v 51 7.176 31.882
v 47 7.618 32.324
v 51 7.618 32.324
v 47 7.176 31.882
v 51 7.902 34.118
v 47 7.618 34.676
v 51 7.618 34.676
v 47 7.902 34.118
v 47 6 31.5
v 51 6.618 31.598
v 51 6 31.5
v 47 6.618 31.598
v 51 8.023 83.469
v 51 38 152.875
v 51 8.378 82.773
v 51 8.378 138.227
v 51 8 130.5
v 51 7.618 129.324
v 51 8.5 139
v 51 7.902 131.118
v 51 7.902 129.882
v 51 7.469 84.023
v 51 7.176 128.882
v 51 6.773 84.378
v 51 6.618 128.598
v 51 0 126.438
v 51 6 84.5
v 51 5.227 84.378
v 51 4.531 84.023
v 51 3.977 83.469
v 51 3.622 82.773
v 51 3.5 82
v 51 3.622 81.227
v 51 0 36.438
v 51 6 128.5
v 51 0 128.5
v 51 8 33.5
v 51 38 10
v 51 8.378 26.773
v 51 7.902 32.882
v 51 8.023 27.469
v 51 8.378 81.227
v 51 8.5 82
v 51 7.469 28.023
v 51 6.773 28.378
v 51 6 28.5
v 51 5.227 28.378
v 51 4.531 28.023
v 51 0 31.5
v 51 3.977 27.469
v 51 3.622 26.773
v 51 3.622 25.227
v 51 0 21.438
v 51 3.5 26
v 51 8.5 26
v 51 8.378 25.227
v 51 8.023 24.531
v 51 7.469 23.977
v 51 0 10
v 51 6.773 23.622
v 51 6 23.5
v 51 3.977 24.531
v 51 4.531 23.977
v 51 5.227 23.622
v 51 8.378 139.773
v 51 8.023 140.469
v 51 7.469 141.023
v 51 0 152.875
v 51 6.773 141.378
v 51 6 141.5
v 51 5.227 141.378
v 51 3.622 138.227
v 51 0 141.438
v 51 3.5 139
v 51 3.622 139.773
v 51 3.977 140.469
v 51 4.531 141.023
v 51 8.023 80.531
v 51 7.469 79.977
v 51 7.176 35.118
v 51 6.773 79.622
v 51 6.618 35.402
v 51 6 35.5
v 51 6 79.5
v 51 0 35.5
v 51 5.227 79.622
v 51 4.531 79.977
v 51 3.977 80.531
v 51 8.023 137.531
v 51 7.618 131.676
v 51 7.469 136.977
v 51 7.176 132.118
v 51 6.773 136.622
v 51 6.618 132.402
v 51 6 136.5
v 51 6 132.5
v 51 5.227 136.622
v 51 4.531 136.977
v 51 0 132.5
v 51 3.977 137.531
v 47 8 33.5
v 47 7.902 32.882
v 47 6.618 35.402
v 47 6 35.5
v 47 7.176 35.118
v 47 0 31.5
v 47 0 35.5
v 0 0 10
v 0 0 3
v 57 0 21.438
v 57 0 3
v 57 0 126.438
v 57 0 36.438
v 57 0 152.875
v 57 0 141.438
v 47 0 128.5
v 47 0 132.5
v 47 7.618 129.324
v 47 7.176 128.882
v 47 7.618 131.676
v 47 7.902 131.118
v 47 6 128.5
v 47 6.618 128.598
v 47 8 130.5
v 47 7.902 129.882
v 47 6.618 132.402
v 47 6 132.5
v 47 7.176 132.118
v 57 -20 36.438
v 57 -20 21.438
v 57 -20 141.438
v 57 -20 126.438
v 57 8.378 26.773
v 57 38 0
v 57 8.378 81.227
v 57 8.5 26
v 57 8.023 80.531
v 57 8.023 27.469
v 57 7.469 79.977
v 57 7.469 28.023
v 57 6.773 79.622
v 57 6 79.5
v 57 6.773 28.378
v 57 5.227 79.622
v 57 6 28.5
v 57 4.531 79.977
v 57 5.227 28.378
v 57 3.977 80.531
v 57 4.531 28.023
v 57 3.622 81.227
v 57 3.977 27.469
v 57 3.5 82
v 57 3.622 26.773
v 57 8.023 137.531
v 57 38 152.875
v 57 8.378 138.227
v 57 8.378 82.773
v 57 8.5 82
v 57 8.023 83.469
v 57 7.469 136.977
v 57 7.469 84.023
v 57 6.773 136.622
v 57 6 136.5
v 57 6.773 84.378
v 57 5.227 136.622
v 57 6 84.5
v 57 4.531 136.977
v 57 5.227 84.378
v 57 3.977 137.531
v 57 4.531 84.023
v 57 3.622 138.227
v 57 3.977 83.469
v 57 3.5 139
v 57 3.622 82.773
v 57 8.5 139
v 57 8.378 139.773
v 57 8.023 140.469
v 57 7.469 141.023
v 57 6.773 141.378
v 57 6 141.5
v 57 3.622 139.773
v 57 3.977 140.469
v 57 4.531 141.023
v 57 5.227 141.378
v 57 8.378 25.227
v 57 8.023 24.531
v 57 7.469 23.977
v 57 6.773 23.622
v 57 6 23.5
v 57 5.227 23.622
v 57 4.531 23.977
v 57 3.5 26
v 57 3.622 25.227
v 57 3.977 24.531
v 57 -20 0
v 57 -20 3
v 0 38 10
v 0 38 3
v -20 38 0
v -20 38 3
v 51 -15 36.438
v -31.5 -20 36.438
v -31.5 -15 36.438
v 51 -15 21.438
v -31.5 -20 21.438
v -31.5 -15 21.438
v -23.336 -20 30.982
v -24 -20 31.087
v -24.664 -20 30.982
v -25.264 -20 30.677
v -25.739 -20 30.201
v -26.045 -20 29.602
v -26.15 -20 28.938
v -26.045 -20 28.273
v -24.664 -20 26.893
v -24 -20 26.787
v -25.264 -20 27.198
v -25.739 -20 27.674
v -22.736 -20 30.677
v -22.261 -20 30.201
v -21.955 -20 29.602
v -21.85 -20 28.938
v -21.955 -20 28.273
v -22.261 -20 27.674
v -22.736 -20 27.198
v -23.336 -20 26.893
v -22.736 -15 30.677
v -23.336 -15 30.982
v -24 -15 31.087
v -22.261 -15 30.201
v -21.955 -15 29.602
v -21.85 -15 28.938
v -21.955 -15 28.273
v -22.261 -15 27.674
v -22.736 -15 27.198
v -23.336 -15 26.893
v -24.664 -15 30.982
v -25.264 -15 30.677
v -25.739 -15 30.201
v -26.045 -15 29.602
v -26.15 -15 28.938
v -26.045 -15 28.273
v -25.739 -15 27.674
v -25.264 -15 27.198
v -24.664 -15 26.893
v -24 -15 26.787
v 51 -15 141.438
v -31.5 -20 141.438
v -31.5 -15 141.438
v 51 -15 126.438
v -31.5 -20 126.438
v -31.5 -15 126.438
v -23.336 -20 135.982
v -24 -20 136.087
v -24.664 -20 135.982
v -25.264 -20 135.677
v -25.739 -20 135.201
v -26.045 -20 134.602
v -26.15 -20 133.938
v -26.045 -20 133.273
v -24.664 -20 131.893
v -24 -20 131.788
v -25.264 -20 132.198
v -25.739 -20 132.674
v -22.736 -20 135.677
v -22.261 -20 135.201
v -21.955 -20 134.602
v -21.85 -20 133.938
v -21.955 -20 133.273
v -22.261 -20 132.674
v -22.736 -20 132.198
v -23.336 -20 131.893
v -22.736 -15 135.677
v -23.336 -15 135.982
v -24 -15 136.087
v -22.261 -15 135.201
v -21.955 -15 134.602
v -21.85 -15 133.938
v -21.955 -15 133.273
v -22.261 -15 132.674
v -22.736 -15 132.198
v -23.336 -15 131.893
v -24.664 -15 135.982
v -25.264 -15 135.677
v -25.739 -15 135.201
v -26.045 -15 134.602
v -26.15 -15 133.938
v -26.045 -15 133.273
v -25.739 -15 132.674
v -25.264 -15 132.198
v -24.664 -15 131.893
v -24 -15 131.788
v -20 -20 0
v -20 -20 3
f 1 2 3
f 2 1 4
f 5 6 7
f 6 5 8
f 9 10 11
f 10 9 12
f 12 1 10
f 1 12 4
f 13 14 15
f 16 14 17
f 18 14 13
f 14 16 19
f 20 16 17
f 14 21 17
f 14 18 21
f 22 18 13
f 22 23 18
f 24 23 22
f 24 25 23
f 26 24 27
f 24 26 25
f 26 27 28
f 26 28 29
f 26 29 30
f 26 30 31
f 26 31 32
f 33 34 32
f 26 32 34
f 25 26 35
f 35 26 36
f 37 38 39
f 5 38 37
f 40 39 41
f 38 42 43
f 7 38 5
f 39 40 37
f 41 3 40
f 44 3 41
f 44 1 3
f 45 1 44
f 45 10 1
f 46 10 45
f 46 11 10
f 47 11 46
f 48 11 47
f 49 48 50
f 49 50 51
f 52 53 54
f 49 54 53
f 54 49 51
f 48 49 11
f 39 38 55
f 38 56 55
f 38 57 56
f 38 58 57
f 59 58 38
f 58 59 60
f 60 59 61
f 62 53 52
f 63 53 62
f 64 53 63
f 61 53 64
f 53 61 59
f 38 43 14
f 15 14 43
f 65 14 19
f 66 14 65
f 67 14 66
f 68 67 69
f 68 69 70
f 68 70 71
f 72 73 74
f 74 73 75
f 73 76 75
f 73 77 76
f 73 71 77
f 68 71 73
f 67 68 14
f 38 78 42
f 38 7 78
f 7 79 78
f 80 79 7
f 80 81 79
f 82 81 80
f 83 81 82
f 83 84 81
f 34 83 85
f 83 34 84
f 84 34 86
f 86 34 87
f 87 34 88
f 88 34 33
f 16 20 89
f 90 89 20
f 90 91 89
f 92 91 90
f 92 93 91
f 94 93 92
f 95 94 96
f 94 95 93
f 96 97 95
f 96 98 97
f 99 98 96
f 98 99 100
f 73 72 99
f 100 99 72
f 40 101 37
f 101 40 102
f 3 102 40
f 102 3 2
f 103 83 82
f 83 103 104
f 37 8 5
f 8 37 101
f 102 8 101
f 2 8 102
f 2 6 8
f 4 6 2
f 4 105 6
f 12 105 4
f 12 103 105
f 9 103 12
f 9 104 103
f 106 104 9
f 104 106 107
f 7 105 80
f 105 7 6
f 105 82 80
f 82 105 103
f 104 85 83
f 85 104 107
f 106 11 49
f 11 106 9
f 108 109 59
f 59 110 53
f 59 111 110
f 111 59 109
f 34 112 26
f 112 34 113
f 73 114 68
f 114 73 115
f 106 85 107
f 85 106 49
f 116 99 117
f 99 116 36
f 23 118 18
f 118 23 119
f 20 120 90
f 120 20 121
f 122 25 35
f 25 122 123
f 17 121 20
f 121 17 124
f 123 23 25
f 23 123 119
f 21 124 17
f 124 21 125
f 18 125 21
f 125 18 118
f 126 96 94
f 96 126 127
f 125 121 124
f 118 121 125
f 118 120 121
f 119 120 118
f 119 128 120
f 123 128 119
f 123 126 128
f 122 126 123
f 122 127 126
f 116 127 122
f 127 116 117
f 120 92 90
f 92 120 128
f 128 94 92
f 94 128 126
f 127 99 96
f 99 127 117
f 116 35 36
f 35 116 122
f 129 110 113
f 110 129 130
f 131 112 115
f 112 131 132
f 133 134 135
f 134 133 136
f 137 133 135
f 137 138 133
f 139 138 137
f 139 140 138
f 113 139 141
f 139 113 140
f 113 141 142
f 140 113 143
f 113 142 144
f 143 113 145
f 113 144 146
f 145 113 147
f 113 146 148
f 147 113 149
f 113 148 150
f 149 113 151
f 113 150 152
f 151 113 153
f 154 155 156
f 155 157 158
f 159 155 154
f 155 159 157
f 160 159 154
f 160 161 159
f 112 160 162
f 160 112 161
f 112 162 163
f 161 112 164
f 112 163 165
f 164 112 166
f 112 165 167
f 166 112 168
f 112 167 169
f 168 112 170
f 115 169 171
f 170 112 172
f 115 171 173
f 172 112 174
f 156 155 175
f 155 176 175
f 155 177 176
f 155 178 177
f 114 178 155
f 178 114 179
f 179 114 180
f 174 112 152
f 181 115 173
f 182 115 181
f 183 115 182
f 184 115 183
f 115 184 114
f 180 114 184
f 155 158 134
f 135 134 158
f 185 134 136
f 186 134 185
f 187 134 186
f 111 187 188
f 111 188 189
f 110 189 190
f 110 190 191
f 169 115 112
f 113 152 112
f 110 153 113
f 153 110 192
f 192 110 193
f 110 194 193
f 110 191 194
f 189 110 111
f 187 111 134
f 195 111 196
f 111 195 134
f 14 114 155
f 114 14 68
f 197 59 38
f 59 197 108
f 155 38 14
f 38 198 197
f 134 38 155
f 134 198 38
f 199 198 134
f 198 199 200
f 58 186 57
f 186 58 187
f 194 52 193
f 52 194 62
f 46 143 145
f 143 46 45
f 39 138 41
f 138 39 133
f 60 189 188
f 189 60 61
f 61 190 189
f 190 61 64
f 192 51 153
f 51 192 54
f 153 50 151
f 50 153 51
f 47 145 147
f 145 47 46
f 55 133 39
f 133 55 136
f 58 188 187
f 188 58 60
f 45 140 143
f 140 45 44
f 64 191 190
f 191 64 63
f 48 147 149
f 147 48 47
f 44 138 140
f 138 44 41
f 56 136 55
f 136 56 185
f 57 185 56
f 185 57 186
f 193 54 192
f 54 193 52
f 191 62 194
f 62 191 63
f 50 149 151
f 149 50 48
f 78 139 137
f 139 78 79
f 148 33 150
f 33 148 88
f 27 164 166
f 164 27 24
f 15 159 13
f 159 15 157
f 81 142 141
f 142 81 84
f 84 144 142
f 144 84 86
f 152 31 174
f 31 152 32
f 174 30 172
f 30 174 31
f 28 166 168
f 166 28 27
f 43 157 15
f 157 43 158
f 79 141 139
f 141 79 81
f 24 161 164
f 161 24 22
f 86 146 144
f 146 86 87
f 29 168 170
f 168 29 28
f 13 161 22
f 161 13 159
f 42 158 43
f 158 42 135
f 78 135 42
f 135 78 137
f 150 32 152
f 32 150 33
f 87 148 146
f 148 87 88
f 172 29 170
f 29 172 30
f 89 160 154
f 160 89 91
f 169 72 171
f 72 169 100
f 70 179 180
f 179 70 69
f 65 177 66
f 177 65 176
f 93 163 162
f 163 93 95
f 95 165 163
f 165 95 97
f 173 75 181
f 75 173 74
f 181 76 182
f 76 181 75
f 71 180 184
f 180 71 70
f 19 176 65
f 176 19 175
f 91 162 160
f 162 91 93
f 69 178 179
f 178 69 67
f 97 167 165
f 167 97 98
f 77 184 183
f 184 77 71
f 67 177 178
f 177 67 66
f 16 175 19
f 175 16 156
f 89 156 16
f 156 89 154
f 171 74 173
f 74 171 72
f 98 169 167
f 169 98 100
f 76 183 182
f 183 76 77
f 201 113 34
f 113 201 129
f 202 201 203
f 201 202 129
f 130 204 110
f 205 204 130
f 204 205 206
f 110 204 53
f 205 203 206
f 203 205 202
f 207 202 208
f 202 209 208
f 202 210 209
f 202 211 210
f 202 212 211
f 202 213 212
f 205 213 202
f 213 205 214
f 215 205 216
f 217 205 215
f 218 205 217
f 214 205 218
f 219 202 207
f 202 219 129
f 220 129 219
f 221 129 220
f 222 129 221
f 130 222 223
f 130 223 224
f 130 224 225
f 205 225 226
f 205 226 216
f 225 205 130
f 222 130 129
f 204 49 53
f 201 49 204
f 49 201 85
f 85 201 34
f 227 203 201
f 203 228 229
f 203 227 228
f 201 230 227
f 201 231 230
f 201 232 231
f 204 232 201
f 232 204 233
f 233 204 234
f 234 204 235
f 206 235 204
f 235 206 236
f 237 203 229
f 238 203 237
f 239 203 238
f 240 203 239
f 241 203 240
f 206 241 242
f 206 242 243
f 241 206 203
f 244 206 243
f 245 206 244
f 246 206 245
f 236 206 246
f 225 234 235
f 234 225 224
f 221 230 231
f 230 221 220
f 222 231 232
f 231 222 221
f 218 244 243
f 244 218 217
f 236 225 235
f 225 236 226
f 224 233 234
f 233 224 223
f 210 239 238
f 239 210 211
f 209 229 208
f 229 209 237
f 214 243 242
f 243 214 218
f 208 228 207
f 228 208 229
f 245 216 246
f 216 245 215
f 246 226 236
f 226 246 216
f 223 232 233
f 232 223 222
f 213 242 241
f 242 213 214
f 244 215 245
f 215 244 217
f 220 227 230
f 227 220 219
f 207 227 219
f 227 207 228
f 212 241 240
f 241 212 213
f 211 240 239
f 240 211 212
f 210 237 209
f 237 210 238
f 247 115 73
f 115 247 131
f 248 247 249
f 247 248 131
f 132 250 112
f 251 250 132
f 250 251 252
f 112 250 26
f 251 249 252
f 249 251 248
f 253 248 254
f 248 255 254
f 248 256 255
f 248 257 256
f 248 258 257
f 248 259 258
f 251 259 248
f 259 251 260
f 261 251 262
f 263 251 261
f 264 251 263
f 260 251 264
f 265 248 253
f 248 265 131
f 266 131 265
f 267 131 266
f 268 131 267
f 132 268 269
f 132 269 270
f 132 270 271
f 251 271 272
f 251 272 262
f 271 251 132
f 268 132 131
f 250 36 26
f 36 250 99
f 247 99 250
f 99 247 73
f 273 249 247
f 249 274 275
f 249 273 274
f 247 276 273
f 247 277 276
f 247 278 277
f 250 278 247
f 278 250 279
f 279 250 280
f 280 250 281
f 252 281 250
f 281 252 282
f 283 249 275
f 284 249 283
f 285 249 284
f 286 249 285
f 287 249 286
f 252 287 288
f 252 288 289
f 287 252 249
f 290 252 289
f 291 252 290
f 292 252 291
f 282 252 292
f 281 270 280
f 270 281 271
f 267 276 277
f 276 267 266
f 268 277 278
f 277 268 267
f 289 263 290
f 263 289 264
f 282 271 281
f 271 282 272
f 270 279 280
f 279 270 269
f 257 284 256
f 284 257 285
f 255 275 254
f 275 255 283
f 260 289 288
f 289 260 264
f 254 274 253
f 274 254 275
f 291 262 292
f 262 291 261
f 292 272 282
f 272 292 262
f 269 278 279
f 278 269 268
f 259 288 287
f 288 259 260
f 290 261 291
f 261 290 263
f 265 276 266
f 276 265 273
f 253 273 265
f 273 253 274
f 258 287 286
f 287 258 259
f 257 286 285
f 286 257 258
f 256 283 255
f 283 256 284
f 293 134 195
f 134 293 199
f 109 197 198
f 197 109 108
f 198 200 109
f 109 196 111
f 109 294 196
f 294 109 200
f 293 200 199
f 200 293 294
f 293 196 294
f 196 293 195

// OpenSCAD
$fn = 20;

chassis_width = 45;

short_wall_height = 12;
tall_wall_height = 142.875;
wall_width = 6;
wall_length = 38;

vertical_spacing = 10;

base_width = chassis_width + 2 * wall_width + 20;
base_length = wall_length + 20;
base_height = 3;

total_w = chassis_width + 2 * wall_width;
module draw_base() {
    translate([-(base_width - total_w), -base_length + wall_length, 0])
        cube([base_width, base_length, base_height]);
}

module draw_riser() {
    cube([chassis_width + 2 * wall_width, wall_length, vertical_spacing]);
}

module draw_tall_wall() {
    knob_curve_diameter = 4;
    knob_protrusion = 4;
    knob_center_y_offset = 8 - knob_curve_diameter / 2;
    knob_flat_length = 6;
    
    knob_z_offsets = [23.5, 120.5];
    
    hole_radius = 2.5;
    hole_z_offsets = [16, 72, 129];
    
    module draw_knob(z_offset) {
        translate([-knob_protrusion, knob_center_y_offset, z_offset]) {
            rotate([0, 90, 0]) {
                cylinder(h = knob_protrusion, d = knob_curve_diameter);
            }
        }
        translate([-knob_protrusion, 0, z_offset - knob_curve_diameter / 2]) {
            cube([knob_protrusion, knob_center_y_offset, knob_curve_diameter]);
        }
    }
    
    module draw_hole(z_offset) {
        translate([0, knob_center_y_offset, z_offset]) {
            rotate([0, 90, 0]) {
                cylinder(h = wall_width, r = hole_radius);
            }
        }
    }
    
    difference() {
        union() {
            cube([wall_width, wall_length, tall_wall_height]);
            for (i = knob_z_offsets) {
                draw_knob(i);
            }
        }
        
        for (i = hole_z_offsets) {
            draw_hole(i);
        }
    }
}

module draw_fan_mount() {
    fan_hole_diameter = 4.3;
    fan_hole_spacing = 105;
    fan_width = 120;
    fan_depth = 25;
    
    fan_y_offset = -20;
    fan_z_offset = vertical_spacing + (tall_wall_height - fan_width) / 2;
    
    hole_offset = (fan_width - fan_hole_spacing) / 2;
    
    bracket_height = hole_offset * 2;//fan_hole_diameter * 3;
    bracket_depth = 5;
    
    // Lower bracket
    translate([
        (total_w - fan_width) / 2,
        fan_y_offset,
        vertical_spacing + (tall_wall_height - fan_hole_spacing) / 2 - bracket_height / 2
    ]) {
        difference() {
            cube([total_w + (fan_width - total_w) / 2, -fan_y_offset, bracket_height]);
            
            translate([-wall_width, bracket_depth, 0])
                cube([total_w + (fan_width - total_w) / 2, -fan_y_offset, bracket_height]);
            
            translate([hole_offset, -fan_y_offset, bracket_height / 2]) {
                rotate([90, 0, 0]) {
                    cylinder(h = -fan_y_offset, d = fan_hole_diameter);
                }
            }
        }
    }
    // Upper bracket
    translate([
        (total_w - fan_width) / 2,
        fan_y_offset,
        vertical_spacing + (tall_wall_height - fan_hole_spacing) / 2 - bracket_height / 2 + fan_hole_spacing
    ]) {
        difference() {
            cube([total_w + (fan_width - total_w) / 2, -fan_y_offset, bracket_height]);
            
            translate([-wall_width, bracket_depth, 0])
                cube([total_w + (fan_width - total_w) / 2, -fan_y_offset, bracket_height]);
            
            translate([hole_offset, -fan_y_offset, bracket_height / 2]) {
                rotate([90, 0, 0]) {
                    cylinder(h = -fan_y_offset, d = fan_hole_diameter);
                }
            }
        }
    }
    
    module draw_fan() {
        color("red") {
            difference() {
                cube([fan_width, fan_depth, fan_width]);
                
                translate([hole_offset, fan_depth, hole_offset]) {
                    rotate([90, 0, 0]) {
                        cylinder(h = fan_depth, d = fan_hole_diameter);
                    }
                }
                translate([fan_width - hole_offset, fan_depth, hole_offset]) {
                    rotate([90, 0, 0]) {
                        cylinder(h = fan_depth, d = fan_hole_diameter);
                    }
                }
                translate([fan_width - hole_offset, fan_depth, fan_width - hole_offset]) {
                    rotate([90, 0, 0]) {
                        cylinder(h = fan_depth, d = fan_hole_diameter);
                    }
                }
                translate([hole_offset, fan_depth, fan_width - hole_offset]) {
                    rotate([90, 0, 0]) {
                        cylinder(h = fan_depth, d = fan_hole_diameter);
                    }
                }
            }
        }
    }
    
    translate([(total_w - fan_width) / 2, fan_y_offset - fan_depth, fan_z_offset]) {
//        draw_fan();
    }
}


module draw_front(draw_fan = true) {
    color("blue") {
        draw_riser();
    }

    color("yellow") {
        translate([chassis_width + wall_width, 0, vertical_spacing])
            draw_tall_wall();
    }

    color("green") {
        draw_base();
    }
    
    if (draw_fan) {
        draw_fan_mount();
    }
}
module draw_rear() {
    mirror([0, 1, 0]) draw_front(false);
}

draw_front();
//draw_rear();
